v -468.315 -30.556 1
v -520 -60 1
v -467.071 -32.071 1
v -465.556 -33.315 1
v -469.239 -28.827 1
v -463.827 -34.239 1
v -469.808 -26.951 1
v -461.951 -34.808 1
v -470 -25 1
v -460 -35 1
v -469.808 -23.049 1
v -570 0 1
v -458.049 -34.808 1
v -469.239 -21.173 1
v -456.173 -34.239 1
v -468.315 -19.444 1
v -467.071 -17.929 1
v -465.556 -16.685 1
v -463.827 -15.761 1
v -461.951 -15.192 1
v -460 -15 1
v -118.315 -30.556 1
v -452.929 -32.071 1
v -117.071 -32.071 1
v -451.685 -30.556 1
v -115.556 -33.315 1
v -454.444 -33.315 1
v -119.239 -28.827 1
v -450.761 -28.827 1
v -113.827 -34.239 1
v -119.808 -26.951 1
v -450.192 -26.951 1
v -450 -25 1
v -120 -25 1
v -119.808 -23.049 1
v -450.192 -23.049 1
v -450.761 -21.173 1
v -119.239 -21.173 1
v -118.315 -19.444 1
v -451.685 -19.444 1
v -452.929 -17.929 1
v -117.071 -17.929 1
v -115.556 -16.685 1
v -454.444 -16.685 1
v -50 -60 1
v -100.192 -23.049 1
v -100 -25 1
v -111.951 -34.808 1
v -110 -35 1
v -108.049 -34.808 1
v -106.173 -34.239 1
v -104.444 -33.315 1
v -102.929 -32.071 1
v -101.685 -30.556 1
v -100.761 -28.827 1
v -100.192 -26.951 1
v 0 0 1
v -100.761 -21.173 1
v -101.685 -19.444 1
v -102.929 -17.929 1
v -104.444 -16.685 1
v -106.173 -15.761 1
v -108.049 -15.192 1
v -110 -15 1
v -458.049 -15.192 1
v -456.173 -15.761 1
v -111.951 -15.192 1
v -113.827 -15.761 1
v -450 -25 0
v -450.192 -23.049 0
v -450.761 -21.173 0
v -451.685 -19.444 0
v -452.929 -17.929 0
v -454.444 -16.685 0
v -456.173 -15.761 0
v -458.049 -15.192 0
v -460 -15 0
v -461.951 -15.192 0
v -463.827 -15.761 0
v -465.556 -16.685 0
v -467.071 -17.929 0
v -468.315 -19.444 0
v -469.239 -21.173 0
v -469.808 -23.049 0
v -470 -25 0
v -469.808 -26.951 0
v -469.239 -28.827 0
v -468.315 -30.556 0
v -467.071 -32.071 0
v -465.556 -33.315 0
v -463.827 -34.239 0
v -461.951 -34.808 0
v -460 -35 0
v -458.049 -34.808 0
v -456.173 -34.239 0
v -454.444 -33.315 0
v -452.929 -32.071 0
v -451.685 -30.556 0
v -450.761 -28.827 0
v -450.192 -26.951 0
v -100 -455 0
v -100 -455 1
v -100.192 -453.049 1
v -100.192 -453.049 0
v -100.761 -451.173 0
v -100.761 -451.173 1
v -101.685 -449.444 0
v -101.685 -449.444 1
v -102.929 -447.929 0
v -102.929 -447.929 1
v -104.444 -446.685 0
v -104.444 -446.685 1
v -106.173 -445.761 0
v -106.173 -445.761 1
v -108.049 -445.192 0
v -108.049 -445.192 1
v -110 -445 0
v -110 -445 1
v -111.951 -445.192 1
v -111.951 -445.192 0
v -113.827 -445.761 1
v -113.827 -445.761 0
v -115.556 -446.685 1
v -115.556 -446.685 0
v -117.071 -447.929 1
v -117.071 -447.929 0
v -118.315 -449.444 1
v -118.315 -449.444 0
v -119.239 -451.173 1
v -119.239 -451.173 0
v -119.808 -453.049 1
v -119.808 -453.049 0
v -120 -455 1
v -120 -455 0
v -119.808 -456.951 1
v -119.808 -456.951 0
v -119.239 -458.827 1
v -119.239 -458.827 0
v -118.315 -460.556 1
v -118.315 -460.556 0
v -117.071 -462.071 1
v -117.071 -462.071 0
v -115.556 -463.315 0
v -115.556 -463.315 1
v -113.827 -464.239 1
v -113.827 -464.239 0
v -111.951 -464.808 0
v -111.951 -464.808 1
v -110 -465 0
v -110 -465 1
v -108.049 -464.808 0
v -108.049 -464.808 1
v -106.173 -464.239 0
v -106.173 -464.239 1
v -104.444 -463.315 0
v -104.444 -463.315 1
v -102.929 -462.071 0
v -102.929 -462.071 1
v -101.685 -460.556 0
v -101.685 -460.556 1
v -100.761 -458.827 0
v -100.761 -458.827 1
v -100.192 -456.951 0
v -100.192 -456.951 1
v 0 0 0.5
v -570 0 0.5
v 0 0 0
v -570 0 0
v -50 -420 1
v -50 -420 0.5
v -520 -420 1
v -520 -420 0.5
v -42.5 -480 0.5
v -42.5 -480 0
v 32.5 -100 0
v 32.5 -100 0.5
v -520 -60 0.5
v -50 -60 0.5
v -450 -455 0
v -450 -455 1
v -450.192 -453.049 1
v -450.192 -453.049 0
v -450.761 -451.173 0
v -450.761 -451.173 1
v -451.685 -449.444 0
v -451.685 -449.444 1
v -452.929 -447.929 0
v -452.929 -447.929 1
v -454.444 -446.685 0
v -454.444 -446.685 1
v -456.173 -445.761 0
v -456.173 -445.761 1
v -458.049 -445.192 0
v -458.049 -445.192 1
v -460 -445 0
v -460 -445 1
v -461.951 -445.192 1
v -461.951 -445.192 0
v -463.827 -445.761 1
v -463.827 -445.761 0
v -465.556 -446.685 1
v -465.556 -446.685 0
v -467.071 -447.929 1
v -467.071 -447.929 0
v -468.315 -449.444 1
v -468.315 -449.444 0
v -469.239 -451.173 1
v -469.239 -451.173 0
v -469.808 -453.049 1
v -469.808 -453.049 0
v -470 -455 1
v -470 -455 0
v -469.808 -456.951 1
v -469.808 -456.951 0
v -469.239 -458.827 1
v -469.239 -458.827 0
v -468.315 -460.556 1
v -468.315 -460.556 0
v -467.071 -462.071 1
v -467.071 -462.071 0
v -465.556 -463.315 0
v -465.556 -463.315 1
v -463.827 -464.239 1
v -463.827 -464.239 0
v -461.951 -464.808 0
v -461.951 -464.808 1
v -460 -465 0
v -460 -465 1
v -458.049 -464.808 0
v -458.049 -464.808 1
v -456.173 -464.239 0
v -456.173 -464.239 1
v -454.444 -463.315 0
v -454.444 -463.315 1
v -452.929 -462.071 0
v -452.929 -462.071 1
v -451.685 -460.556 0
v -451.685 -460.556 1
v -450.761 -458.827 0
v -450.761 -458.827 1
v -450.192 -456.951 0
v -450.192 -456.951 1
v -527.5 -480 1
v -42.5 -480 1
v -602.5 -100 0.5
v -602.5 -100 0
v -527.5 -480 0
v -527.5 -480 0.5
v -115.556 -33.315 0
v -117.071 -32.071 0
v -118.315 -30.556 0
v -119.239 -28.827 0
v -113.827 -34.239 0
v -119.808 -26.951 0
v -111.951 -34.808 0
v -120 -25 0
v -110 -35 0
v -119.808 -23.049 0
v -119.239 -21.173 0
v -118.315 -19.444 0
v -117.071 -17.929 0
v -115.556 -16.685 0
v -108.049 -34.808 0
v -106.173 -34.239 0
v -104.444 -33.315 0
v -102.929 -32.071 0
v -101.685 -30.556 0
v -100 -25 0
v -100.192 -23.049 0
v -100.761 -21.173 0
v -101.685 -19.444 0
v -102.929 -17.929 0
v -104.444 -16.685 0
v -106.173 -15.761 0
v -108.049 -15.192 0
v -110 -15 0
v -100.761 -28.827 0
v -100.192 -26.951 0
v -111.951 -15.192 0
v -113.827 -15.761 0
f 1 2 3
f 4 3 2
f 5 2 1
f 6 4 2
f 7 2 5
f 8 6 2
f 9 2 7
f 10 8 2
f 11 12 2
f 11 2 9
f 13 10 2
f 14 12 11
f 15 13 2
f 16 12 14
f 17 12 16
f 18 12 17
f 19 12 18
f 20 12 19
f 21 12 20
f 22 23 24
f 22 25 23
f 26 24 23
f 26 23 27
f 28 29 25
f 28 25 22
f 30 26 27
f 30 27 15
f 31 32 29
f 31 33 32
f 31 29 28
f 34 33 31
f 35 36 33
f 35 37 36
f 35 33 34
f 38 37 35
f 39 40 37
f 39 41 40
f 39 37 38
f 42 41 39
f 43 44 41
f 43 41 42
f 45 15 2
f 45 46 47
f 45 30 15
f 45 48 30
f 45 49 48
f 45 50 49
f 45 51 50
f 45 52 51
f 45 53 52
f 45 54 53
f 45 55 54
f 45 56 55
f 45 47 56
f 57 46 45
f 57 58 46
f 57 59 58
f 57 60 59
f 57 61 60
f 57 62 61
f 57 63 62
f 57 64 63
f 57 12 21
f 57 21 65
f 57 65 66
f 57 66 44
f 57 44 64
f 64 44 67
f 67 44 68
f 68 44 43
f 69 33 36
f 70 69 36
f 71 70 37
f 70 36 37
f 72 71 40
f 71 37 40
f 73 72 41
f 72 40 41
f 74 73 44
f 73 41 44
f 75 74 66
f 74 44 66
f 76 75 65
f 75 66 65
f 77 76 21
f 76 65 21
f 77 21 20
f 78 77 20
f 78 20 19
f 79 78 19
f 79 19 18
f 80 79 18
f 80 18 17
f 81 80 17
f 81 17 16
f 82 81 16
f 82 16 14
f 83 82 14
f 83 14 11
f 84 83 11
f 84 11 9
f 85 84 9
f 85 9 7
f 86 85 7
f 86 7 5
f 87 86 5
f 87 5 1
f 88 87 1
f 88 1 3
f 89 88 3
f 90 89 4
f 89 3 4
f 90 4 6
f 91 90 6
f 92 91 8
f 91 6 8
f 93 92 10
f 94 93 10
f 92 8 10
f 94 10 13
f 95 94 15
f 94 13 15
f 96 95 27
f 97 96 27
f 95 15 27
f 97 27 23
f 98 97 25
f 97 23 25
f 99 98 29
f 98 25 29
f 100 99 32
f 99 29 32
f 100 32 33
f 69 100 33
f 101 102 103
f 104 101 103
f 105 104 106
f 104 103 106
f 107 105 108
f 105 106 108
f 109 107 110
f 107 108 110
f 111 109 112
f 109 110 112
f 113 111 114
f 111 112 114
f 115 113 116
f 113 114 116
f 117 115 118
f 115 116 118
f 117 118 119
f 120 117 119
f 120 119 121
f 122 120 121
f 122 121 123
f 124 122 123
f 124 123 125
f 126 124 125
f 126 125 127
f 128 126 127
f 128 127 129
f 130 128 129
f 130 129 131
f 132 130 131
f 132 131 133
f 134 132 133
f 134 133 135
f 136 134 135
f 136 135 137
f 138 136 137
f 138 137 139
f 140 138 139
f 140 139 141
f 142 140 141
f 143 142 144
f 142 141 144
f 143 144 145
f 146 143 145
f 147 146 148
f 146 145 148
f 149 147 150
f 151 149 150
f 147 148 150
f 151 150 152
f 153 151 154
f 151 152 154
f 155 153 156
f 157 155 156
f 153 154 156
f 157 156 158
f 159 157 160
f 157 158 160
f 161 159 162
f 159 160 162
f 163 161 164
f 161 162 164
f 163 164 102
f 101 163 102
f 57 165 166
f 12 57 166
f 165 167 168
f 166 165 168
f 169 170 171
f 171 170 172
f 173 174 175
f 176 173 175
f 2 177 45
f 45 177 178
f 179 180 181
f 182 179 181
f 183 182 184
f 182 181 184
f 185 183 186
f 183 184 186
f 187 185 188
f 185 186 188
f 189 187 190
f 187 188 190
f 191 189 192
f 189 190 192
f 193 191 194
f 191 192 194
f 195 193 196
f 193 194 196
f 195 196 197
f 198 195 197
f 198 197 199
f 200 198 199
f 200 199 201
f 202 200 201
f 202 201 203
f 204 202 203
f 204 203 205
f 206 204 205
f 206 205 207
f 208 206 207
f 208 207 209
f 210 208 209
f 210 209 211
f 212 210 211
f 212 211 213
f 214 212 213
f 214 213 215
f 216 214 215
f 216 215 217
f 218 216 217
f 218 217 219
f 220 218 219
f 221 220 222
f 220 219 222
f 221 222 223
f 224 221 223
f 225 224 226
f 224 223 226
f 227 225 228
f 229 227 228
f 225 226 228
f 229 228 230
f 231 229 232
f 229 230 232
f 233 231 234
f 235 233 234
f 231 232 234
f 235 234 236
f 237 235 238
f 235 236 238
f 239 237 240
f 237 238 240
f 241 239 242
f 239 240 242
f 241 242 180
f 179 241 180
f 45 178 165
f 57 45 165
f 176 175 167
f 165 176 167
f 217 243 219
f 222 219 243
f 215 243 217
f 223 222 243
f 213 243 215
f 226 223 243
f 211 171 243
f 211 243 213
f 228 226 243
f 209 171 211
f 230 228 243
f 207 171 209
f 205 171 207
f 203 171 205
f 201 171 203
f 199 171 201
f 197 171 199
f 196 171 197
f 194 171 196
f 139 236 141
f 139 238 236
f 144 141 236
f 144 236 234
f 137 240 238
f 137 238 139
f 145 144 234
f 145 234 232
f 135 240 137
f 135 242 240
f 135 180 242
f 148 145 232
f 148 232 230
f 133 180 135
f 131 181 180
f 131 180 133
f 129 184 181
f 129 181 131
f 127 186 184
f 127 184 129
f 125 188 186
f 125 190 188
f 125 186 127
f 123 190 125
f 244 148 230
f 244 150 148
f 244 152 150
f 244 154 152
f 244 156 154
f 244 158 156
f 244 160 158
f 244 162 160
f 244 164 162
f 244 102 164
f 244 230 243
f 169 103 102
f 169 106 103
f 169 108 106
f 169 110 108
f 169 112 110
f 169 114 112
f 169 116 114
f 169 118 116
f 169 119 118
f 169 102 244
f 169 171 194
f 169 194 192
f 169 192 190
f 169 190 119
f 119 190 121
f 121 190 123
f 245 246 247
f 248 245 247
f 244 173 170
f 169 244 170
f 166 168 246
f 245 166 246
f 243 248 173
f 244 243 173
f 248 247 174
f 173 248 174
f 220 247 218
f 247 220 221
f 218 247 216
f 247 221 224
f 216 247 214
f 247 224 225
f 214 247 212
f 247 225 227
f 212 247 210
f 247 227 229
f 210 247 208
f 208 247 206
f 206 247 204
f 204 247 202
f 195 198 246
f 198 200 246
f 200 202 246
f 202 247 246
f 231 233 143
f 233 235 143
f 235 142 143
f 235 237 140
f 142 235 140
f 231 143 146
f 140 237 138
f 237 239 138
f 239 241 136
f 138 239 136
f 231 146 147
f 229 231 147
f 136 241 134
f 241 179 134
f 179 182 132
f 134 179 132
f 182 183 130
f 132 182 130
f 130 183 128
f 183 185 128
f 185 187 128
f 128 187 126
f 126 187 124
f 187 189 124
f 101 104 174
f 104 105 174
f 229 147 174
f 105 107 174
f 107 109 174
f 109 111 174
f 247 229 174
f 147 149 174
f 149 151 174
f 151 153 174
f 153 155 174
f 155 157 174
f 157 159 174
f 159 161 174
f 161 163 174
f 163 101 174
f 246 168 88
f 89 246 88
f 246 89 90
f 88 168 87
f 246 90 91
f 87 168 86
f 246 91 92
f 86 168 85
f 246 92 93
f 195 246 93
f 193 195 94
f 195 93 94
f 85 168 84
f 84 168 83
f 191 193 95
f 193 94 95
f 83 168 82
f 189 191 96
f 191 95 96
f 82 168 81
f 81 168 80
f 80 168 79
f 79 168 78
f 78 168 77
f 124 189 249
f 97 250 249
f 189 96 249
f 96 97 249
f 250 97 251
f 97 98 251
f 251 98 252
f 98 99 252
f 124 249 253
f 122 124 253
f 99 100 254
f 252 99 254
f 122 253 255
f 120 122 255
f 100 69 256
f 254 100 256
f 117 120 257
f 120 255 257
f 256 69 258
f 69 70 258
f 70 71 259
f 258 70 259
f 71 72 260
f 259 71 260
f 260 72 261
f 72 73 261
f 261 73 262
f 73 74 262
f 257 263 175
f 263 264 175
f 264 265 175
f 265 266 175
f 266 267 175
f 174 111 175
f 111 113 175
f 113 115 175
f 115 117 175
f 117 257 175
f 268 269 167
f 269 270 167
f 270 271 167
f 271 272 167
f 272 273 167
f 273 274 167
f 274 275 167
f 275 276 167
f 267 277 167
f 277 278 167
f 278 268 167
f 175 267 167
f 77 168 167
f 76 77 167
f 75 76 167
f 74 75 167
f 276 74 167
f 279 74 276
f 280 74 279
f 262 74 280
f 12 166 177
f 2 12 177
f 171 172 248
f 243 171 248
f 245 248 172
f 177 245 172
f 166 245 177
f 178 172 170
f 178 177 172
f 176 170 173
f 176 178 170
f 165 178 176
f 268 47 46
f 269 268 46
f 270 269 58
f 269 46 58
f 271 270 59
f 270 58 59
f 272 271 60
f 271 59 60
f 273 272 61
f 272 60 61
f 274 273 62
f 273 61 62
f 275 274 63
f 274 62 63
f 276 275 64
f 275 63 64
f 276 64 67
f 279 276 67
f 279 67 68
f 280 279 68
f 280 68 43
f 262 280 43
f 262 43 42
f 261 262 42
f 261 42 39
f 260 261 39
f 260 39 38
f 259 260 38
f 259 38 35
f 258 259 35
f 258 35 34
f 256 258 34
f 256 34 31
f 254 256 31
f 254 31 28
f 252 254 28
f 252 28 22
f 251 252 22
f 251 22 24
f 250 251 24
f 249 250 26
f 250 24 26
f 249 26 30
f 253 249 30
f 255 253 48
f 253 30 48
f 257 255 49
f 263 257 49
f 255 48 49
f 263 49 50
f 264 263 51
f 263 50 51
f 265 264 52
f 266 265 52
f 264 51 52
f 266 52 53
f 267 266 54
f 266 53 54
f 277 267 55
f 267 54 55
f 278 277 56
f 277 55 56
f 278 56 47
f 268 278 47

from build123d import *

# Parameters (mm, degrees)
F1_DEPTH = 0.5
F3_DEPTH = 0.5
F4_R     = 10
F5_DEPTH = 1.001


with BuildPart() as f1:
    # F0 (on Top) → F1 (new body)
    with BuildSketch(Plane.XY):
        Polygon((0, 0), (-570, 0), (-602.5, -100), (-527.5, -480), (-42.5, -480), (32.5, -100), align=None)
    extrude(amount=F1_DEPTH)

    # F2 (on face) → F3 (join)
    with BuildSketch(Plane.XY.offset(0.5)):
        Polygon((0, 0), (-570, 0), (-520, -60), (-50, -60), align=None)
        Polygon((-527.5, -480), (-42.5, -480), (-50, -420), (-520, -420), align=None)
    extrude(amount=F3_DEPTH)

    # F4 (on face) → F5 (cut, through all)
    with BuildSketch(Plane.XY.offset(1)):
        with Locations((-460, -25)):
            Circle(F4_R)
        with Locations((-460, -455)):
            Circle(F4_R)
        with Locations((-110, -25)):
            Circle(F4_R)
        with Locations((-110, -455)):
            Circle(F4_R)
    extrude(amount=-F5_DEPTH, mode=Mode.SUBTRACT)


solid = f1.part
